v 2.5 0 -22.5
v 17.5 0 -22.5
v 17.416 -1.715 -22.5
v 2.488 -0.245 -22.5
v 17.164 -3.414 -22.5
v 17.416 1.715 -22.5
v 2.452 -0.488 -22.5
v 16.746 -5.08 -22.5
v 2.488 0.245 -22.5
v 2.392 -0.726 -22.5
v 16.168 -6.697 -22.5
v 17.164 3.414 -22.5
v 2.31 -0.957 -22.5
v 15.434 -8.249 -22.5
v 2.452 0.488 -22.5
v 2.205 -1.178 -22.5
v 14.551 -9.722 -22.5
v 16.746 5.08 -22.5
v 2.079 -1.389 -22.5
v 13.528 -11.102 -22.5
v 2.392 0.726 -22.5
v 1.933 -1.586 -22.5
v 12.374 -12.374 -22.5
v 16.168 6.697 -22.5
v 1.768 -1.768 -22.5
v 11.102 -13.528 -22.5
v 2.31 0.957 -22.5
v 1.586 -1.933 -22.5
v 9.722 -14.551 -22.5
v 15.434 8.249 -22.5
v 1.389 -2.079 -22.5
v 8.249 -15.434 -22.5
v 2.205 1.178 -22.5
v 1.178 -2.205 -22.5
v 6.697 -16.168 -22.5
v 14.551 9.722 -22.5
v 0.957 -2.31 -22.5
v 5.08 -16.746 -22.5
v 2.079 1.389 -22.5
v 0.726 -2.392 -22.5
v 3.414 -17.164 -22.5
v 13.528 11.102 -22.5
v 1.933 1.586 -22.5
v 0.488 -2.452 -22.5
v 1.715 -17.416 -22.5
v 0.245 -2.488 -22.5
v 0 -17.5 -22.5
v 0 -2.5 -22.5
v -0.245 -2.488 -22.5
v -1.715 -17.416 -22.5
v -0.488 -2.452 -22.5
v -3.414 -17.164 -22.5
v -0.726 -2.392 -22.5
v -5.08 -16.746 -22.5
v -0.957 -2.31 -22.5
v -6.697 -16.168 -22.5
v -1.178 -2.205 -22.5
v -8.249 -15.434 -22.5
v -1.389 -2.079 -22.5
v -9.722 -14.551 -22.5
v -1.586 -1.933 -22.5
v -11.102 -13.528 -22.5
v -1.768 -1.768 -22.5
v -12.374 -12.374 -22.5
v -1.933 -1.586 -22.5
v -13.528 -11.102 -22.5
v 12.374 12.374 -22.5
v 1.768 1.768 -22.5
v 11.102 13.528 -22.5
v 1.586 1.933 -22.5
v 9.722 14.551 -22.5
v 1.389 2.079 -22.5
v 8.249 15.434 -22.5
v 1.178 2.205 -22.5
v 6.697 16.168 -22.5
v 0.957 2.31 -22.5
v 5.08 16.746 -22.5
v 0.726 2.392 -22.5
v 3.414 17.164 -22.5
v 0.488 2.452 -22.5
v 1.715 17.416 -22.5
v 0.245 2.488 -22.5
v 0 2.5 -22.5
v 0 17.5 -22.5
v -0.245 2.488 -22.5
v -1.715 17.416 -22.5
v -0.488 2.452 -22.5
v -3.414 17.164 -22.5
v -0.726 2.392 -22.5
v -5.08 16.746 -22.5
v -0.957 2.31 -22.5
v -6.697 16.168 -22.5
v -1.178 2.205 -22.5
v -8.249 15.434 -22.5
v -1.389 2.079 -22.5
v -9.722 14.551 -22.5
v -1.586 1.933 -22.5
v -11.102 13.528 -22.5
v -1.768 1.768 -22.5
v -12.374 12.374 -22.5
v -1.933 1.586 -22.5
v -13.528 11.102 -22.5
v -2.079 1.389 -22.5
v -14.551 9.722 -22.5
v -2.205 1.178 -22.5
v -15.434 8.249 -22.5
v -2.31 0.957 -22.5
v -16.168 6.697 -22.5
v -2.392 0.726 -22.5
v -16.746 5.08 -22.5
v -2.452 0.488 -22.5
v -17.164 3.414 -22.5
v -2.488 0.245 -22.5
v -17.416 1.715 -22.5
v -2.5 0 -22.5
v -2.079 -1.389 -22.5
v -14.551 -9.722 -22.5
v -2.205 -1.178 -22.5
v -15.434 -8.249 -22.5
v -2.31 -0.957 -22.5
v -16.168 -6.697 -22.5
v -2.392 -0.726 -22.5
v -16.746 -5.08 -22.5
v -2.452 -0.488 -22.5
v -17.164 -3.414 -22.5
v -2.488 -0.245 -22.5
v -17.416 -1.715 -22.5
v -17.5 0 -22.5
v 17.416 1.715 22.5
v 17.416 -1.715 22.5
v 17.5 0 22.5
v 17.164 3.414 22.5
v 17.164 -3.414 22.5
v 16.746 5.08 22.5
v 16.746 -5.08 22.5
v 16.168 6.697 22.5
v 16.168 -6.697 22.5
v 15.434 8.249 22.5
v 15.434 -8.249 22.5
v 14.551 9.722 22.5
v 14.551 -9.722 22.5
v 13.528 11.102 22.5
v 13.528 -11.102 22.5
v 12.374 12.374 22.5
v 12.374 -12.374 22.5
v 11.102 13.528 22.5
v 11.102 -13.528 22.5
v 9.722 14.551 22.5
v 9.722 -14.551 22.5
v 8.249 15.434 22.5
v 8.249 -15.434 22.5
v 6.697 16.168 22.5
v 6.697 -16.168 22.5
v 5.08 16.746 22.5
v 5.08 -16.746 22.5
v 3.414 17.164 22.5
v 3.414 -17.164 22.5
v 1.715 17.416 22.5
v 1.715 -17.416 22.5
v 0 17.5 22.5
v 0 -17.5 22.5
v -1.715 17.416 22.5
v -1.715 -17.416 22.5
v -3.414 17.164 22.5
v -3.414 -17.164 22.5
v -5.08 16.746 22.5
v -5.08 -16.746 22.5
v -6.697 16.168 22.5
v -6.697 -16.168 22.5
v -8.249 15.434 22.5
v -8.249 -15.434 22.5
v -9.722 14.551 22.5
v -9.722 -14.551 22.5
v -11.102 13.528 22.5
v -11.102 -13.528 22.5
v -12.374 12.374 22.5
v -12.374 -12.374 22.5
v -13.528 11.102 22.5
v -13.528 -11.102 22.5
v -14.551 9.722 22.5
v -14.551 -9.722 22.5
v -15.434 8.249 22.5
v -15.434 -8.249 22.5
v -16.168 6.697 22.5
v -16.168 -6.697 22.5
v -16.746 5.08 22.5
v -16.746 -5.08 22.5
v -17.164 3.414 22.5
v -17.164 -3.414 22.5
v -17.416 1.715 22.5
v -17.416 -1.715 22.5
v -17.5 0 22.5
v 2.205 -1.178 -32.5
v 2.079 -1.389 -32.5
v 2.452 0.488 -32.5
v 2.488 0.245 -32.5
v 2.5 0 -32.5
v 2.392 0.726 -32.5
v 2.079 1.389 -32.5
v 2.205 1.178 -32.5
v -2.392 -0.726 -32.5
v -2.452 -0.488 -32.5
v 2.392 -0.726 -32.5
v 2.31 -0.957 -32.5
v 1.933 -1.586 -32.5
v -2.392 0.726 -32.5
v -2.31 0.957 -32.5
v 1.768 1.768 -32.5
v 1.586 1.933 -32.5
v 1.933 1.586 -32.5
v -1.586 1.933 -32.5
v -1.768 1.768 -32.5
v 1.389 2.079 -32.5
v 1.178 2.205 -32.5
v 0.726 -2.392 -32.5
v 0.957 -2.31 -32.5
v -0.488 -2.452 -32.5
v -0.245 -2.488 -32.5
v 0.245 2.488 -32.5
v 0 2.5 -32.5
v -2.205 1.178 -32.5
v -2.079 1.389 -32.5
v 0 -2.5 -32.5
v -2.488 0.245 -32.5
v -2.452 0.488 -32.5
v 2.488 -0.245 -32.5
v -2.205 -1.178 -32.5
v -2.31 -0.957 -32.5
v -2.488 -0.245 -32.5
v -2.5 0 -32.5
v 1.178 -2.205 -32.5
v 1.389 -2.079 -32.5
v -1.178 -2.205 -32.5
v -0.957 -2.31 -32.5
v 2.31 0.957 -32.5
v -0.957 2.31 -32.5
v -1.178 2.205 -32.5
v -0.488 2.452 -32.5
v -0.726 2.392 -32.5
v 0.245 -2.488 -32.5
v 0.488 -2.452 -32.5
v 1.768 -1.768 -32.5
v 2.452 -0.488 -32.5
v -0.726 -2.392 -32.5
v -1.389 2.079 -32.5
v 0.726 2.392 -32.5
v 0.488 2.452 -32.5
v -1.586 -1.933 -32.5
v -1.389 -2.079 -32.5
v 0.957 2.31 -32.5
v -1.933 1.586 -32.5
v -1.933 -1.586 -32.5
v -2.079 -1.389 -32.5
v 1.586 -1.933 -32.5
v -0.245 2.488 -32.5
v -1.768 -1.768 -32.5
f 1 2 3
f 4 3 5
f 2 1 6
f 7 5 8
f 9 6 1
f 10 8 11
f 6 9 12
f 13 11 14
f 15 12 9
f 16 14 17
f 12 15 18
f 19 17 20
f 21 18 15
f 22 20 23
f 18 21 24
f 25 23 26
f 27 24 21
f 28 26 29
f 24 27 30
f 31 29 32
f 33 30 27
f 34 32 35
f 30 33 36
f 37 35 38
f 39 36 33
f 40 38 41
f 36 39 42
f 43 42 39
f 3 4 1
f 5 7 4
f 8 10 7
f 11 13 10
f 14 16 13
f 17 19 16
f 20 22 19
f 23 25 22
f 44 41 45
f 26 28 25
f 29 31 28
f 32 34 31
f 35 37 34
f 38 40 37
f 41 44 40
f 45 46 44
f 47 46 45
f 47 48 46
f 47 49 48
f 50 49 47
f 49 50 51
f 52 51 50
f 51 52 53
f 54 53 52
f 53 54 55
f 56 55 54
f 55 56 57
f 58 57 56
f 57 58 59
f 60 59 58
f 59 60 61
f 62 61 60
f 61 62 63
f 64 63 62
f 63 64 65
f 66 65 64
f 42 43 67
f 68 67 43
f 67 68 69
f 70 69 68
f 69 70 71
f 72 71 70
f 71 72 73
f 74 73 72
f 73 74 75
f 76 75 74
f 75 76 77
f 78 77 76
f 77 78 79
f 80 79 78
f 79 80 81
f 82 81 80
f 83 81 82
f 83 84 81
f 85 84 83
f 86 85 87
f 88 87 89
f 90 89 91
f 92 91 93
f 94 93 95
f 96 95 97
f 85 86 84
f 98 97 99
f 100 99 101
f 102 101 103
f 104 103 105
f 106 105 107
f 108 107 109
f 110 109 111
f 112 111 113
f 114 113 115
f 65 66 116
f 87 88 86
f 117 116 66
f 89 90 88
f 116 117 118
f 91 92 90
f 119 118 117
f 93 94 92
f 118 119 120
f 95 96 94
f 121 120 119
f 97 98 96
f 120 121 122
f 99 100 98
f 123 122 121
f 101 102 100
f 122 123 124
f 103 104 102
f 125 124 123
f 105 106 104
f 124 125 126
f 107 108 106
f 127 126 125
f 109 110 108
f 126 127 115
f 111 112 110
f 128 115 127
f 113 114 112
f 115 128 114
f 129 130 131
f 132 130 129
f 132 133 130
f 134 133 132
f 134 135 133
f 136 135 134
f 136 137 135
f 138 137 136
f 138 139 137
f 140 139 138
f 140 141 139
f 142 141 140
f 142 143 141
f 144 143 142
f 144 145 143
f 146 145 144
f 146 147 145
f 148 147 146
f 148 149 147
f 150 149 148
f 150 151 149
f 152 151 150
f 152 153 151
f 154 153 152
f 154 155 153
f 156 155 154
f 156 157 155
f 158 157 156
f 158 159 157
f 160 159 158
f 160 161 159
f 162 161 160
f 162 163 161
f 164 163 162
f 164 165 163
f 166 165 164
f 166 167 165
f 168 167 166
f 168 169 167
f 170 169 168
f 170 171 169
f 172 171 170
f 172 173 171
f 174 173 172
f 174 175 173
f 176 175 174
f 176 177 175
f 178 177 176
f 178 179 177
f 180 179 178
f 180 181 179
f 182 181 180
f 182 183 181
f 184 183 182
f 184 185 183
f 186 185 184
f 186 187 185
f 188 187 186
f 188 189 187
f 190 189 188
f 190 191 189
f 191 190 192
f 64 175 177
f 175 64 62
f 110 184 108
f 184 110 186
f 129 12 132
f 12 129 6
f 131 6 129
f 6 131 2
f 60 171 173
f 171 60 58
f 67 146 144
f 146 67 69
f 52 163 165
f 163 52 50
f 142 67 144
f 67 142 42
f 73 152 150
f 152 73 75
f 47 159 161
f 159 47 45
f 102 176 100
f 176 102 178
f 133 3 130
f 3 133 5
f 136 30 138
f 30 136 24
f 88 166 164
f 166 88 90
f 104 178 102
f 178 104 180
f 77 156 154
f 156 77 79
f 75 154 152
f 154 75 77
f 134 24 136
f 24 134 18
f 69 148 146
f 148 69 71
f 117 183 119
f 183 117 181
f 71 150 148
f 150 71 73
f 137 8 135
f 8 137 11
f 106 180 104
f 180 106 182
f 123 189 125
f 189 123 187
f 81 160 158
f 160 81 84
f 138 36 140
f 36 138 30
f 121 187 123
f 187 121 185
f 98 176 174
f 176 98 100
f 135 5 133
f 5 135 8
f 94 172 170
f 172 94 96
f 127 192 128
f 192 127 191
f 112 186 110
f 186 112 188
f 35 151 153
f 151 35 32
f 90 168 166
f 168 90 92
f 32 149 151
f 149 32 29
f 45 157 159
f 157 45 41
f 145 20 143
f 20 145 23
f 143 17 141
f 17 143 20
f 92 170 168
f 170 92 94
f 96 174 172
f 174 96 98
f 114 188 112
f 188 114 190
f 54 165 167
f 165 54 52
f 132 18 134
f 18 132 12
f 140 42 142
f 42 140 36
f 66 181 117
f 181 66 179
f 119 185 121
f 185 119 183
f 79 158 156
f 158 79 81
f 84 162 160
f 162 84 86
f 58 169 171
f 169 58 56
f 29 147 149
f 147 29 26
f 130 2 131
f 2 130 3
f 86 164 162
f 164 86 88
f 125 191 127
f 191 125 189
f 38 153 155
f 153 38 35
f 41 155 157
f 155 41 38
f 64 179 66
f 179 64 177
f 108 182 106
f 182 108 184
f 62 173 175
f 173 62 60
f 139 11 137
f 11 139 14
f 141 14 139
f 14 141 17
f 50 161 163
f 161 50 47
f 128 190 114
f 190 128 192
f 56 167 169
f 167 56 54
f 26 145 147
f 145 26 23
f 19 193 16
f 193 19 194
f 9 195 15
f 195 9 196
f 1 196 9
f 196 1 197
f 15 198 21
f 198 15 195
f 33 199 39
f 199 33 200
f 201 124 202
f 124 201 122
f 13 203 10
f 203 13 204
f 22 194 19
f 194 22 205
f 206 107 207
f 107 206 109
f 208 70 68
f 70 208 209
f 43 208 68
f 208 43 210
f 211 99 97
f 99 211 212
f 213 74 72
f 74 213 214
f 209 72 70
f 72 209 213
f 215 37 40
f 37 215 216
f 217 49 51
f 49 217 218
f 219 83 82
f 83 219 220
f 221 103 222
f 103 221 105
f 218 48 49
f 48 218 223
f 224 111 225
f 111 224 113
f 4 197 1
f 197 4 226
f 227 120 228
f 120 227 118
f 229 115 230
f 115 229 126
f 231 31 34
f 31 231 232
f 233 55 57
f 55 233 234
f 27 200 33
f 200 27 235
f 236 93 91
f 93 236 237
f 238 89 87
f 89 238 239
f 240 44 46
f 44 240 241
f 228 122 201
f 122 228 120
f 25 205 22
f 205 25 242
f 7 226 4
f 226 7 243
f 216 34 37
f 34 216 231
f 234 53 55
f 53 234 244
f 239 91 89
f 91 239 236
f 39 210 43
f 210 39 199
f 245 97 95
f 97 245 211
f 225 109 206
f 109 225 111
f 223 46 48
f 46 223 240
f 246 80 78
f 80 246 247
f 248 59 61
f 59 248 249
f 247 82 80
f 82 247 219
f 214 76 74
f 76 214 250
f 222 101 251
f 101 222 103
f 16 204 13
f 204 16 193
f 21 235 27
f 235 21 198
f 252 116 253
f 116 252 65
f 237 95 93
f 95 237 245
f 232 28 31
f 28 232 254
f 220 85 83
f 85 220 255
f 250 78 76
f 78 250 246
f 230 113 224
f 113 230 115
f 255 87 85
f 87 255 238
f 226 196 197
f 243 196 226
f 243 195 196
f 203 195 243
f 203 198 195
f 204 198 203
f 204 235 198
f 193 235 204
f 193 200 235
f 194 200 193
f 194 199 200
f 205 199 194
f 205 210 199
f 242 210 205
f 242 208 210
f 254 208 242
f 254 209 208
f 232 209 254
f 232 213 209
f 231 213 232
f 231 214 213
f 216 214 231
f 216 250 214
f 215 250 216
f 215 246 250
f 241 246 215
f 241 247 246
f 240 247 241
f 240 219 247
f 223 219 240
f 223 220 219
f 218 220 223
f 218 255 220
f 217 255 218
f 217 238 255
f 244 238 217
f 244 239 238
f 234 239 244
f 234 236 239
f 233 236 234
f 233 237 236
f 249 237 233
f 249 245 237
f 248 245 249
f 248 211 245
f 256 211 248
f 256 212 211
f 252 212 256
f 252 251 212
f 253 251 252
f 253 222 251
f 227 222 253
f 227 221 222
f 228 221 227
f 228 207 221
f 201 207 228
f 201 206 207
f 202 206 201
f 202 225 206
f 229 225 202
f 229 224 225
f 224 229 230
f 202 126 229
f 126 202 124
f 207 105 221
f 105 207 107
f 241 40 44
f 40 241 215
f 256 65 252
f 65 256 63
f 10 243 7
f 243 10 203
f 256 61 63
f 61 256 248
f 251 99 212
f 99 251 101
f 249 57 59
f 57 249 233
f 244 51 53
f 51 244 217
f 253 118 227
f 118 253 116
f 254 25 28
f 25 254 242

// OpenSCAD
module brushless_dc_motor() {
    // Stator
    module stator() {
        cylinder(d=35.0, h=45.0, $fn=64);
    }
    
    // Rotor
    module rotor() {
        difference() {
            cylinder(d=33.0, h=45.0, $fn=64);
            translate([0, 0, -1])
                cylinder(d=20.0, h=47.0, $fn=64);
        }
    }
    
    // Shaft
    module shaft() {
        translate([0, 0, -10])
            cylinder(d=5.0, h=55.0, $fn=64);
    }
    
    // Assemble motor
    union() {
        stator();
        rotor();
        shaft();
    }
}

translate([0, 0, -22.5])
    brushless_dc_motor();
